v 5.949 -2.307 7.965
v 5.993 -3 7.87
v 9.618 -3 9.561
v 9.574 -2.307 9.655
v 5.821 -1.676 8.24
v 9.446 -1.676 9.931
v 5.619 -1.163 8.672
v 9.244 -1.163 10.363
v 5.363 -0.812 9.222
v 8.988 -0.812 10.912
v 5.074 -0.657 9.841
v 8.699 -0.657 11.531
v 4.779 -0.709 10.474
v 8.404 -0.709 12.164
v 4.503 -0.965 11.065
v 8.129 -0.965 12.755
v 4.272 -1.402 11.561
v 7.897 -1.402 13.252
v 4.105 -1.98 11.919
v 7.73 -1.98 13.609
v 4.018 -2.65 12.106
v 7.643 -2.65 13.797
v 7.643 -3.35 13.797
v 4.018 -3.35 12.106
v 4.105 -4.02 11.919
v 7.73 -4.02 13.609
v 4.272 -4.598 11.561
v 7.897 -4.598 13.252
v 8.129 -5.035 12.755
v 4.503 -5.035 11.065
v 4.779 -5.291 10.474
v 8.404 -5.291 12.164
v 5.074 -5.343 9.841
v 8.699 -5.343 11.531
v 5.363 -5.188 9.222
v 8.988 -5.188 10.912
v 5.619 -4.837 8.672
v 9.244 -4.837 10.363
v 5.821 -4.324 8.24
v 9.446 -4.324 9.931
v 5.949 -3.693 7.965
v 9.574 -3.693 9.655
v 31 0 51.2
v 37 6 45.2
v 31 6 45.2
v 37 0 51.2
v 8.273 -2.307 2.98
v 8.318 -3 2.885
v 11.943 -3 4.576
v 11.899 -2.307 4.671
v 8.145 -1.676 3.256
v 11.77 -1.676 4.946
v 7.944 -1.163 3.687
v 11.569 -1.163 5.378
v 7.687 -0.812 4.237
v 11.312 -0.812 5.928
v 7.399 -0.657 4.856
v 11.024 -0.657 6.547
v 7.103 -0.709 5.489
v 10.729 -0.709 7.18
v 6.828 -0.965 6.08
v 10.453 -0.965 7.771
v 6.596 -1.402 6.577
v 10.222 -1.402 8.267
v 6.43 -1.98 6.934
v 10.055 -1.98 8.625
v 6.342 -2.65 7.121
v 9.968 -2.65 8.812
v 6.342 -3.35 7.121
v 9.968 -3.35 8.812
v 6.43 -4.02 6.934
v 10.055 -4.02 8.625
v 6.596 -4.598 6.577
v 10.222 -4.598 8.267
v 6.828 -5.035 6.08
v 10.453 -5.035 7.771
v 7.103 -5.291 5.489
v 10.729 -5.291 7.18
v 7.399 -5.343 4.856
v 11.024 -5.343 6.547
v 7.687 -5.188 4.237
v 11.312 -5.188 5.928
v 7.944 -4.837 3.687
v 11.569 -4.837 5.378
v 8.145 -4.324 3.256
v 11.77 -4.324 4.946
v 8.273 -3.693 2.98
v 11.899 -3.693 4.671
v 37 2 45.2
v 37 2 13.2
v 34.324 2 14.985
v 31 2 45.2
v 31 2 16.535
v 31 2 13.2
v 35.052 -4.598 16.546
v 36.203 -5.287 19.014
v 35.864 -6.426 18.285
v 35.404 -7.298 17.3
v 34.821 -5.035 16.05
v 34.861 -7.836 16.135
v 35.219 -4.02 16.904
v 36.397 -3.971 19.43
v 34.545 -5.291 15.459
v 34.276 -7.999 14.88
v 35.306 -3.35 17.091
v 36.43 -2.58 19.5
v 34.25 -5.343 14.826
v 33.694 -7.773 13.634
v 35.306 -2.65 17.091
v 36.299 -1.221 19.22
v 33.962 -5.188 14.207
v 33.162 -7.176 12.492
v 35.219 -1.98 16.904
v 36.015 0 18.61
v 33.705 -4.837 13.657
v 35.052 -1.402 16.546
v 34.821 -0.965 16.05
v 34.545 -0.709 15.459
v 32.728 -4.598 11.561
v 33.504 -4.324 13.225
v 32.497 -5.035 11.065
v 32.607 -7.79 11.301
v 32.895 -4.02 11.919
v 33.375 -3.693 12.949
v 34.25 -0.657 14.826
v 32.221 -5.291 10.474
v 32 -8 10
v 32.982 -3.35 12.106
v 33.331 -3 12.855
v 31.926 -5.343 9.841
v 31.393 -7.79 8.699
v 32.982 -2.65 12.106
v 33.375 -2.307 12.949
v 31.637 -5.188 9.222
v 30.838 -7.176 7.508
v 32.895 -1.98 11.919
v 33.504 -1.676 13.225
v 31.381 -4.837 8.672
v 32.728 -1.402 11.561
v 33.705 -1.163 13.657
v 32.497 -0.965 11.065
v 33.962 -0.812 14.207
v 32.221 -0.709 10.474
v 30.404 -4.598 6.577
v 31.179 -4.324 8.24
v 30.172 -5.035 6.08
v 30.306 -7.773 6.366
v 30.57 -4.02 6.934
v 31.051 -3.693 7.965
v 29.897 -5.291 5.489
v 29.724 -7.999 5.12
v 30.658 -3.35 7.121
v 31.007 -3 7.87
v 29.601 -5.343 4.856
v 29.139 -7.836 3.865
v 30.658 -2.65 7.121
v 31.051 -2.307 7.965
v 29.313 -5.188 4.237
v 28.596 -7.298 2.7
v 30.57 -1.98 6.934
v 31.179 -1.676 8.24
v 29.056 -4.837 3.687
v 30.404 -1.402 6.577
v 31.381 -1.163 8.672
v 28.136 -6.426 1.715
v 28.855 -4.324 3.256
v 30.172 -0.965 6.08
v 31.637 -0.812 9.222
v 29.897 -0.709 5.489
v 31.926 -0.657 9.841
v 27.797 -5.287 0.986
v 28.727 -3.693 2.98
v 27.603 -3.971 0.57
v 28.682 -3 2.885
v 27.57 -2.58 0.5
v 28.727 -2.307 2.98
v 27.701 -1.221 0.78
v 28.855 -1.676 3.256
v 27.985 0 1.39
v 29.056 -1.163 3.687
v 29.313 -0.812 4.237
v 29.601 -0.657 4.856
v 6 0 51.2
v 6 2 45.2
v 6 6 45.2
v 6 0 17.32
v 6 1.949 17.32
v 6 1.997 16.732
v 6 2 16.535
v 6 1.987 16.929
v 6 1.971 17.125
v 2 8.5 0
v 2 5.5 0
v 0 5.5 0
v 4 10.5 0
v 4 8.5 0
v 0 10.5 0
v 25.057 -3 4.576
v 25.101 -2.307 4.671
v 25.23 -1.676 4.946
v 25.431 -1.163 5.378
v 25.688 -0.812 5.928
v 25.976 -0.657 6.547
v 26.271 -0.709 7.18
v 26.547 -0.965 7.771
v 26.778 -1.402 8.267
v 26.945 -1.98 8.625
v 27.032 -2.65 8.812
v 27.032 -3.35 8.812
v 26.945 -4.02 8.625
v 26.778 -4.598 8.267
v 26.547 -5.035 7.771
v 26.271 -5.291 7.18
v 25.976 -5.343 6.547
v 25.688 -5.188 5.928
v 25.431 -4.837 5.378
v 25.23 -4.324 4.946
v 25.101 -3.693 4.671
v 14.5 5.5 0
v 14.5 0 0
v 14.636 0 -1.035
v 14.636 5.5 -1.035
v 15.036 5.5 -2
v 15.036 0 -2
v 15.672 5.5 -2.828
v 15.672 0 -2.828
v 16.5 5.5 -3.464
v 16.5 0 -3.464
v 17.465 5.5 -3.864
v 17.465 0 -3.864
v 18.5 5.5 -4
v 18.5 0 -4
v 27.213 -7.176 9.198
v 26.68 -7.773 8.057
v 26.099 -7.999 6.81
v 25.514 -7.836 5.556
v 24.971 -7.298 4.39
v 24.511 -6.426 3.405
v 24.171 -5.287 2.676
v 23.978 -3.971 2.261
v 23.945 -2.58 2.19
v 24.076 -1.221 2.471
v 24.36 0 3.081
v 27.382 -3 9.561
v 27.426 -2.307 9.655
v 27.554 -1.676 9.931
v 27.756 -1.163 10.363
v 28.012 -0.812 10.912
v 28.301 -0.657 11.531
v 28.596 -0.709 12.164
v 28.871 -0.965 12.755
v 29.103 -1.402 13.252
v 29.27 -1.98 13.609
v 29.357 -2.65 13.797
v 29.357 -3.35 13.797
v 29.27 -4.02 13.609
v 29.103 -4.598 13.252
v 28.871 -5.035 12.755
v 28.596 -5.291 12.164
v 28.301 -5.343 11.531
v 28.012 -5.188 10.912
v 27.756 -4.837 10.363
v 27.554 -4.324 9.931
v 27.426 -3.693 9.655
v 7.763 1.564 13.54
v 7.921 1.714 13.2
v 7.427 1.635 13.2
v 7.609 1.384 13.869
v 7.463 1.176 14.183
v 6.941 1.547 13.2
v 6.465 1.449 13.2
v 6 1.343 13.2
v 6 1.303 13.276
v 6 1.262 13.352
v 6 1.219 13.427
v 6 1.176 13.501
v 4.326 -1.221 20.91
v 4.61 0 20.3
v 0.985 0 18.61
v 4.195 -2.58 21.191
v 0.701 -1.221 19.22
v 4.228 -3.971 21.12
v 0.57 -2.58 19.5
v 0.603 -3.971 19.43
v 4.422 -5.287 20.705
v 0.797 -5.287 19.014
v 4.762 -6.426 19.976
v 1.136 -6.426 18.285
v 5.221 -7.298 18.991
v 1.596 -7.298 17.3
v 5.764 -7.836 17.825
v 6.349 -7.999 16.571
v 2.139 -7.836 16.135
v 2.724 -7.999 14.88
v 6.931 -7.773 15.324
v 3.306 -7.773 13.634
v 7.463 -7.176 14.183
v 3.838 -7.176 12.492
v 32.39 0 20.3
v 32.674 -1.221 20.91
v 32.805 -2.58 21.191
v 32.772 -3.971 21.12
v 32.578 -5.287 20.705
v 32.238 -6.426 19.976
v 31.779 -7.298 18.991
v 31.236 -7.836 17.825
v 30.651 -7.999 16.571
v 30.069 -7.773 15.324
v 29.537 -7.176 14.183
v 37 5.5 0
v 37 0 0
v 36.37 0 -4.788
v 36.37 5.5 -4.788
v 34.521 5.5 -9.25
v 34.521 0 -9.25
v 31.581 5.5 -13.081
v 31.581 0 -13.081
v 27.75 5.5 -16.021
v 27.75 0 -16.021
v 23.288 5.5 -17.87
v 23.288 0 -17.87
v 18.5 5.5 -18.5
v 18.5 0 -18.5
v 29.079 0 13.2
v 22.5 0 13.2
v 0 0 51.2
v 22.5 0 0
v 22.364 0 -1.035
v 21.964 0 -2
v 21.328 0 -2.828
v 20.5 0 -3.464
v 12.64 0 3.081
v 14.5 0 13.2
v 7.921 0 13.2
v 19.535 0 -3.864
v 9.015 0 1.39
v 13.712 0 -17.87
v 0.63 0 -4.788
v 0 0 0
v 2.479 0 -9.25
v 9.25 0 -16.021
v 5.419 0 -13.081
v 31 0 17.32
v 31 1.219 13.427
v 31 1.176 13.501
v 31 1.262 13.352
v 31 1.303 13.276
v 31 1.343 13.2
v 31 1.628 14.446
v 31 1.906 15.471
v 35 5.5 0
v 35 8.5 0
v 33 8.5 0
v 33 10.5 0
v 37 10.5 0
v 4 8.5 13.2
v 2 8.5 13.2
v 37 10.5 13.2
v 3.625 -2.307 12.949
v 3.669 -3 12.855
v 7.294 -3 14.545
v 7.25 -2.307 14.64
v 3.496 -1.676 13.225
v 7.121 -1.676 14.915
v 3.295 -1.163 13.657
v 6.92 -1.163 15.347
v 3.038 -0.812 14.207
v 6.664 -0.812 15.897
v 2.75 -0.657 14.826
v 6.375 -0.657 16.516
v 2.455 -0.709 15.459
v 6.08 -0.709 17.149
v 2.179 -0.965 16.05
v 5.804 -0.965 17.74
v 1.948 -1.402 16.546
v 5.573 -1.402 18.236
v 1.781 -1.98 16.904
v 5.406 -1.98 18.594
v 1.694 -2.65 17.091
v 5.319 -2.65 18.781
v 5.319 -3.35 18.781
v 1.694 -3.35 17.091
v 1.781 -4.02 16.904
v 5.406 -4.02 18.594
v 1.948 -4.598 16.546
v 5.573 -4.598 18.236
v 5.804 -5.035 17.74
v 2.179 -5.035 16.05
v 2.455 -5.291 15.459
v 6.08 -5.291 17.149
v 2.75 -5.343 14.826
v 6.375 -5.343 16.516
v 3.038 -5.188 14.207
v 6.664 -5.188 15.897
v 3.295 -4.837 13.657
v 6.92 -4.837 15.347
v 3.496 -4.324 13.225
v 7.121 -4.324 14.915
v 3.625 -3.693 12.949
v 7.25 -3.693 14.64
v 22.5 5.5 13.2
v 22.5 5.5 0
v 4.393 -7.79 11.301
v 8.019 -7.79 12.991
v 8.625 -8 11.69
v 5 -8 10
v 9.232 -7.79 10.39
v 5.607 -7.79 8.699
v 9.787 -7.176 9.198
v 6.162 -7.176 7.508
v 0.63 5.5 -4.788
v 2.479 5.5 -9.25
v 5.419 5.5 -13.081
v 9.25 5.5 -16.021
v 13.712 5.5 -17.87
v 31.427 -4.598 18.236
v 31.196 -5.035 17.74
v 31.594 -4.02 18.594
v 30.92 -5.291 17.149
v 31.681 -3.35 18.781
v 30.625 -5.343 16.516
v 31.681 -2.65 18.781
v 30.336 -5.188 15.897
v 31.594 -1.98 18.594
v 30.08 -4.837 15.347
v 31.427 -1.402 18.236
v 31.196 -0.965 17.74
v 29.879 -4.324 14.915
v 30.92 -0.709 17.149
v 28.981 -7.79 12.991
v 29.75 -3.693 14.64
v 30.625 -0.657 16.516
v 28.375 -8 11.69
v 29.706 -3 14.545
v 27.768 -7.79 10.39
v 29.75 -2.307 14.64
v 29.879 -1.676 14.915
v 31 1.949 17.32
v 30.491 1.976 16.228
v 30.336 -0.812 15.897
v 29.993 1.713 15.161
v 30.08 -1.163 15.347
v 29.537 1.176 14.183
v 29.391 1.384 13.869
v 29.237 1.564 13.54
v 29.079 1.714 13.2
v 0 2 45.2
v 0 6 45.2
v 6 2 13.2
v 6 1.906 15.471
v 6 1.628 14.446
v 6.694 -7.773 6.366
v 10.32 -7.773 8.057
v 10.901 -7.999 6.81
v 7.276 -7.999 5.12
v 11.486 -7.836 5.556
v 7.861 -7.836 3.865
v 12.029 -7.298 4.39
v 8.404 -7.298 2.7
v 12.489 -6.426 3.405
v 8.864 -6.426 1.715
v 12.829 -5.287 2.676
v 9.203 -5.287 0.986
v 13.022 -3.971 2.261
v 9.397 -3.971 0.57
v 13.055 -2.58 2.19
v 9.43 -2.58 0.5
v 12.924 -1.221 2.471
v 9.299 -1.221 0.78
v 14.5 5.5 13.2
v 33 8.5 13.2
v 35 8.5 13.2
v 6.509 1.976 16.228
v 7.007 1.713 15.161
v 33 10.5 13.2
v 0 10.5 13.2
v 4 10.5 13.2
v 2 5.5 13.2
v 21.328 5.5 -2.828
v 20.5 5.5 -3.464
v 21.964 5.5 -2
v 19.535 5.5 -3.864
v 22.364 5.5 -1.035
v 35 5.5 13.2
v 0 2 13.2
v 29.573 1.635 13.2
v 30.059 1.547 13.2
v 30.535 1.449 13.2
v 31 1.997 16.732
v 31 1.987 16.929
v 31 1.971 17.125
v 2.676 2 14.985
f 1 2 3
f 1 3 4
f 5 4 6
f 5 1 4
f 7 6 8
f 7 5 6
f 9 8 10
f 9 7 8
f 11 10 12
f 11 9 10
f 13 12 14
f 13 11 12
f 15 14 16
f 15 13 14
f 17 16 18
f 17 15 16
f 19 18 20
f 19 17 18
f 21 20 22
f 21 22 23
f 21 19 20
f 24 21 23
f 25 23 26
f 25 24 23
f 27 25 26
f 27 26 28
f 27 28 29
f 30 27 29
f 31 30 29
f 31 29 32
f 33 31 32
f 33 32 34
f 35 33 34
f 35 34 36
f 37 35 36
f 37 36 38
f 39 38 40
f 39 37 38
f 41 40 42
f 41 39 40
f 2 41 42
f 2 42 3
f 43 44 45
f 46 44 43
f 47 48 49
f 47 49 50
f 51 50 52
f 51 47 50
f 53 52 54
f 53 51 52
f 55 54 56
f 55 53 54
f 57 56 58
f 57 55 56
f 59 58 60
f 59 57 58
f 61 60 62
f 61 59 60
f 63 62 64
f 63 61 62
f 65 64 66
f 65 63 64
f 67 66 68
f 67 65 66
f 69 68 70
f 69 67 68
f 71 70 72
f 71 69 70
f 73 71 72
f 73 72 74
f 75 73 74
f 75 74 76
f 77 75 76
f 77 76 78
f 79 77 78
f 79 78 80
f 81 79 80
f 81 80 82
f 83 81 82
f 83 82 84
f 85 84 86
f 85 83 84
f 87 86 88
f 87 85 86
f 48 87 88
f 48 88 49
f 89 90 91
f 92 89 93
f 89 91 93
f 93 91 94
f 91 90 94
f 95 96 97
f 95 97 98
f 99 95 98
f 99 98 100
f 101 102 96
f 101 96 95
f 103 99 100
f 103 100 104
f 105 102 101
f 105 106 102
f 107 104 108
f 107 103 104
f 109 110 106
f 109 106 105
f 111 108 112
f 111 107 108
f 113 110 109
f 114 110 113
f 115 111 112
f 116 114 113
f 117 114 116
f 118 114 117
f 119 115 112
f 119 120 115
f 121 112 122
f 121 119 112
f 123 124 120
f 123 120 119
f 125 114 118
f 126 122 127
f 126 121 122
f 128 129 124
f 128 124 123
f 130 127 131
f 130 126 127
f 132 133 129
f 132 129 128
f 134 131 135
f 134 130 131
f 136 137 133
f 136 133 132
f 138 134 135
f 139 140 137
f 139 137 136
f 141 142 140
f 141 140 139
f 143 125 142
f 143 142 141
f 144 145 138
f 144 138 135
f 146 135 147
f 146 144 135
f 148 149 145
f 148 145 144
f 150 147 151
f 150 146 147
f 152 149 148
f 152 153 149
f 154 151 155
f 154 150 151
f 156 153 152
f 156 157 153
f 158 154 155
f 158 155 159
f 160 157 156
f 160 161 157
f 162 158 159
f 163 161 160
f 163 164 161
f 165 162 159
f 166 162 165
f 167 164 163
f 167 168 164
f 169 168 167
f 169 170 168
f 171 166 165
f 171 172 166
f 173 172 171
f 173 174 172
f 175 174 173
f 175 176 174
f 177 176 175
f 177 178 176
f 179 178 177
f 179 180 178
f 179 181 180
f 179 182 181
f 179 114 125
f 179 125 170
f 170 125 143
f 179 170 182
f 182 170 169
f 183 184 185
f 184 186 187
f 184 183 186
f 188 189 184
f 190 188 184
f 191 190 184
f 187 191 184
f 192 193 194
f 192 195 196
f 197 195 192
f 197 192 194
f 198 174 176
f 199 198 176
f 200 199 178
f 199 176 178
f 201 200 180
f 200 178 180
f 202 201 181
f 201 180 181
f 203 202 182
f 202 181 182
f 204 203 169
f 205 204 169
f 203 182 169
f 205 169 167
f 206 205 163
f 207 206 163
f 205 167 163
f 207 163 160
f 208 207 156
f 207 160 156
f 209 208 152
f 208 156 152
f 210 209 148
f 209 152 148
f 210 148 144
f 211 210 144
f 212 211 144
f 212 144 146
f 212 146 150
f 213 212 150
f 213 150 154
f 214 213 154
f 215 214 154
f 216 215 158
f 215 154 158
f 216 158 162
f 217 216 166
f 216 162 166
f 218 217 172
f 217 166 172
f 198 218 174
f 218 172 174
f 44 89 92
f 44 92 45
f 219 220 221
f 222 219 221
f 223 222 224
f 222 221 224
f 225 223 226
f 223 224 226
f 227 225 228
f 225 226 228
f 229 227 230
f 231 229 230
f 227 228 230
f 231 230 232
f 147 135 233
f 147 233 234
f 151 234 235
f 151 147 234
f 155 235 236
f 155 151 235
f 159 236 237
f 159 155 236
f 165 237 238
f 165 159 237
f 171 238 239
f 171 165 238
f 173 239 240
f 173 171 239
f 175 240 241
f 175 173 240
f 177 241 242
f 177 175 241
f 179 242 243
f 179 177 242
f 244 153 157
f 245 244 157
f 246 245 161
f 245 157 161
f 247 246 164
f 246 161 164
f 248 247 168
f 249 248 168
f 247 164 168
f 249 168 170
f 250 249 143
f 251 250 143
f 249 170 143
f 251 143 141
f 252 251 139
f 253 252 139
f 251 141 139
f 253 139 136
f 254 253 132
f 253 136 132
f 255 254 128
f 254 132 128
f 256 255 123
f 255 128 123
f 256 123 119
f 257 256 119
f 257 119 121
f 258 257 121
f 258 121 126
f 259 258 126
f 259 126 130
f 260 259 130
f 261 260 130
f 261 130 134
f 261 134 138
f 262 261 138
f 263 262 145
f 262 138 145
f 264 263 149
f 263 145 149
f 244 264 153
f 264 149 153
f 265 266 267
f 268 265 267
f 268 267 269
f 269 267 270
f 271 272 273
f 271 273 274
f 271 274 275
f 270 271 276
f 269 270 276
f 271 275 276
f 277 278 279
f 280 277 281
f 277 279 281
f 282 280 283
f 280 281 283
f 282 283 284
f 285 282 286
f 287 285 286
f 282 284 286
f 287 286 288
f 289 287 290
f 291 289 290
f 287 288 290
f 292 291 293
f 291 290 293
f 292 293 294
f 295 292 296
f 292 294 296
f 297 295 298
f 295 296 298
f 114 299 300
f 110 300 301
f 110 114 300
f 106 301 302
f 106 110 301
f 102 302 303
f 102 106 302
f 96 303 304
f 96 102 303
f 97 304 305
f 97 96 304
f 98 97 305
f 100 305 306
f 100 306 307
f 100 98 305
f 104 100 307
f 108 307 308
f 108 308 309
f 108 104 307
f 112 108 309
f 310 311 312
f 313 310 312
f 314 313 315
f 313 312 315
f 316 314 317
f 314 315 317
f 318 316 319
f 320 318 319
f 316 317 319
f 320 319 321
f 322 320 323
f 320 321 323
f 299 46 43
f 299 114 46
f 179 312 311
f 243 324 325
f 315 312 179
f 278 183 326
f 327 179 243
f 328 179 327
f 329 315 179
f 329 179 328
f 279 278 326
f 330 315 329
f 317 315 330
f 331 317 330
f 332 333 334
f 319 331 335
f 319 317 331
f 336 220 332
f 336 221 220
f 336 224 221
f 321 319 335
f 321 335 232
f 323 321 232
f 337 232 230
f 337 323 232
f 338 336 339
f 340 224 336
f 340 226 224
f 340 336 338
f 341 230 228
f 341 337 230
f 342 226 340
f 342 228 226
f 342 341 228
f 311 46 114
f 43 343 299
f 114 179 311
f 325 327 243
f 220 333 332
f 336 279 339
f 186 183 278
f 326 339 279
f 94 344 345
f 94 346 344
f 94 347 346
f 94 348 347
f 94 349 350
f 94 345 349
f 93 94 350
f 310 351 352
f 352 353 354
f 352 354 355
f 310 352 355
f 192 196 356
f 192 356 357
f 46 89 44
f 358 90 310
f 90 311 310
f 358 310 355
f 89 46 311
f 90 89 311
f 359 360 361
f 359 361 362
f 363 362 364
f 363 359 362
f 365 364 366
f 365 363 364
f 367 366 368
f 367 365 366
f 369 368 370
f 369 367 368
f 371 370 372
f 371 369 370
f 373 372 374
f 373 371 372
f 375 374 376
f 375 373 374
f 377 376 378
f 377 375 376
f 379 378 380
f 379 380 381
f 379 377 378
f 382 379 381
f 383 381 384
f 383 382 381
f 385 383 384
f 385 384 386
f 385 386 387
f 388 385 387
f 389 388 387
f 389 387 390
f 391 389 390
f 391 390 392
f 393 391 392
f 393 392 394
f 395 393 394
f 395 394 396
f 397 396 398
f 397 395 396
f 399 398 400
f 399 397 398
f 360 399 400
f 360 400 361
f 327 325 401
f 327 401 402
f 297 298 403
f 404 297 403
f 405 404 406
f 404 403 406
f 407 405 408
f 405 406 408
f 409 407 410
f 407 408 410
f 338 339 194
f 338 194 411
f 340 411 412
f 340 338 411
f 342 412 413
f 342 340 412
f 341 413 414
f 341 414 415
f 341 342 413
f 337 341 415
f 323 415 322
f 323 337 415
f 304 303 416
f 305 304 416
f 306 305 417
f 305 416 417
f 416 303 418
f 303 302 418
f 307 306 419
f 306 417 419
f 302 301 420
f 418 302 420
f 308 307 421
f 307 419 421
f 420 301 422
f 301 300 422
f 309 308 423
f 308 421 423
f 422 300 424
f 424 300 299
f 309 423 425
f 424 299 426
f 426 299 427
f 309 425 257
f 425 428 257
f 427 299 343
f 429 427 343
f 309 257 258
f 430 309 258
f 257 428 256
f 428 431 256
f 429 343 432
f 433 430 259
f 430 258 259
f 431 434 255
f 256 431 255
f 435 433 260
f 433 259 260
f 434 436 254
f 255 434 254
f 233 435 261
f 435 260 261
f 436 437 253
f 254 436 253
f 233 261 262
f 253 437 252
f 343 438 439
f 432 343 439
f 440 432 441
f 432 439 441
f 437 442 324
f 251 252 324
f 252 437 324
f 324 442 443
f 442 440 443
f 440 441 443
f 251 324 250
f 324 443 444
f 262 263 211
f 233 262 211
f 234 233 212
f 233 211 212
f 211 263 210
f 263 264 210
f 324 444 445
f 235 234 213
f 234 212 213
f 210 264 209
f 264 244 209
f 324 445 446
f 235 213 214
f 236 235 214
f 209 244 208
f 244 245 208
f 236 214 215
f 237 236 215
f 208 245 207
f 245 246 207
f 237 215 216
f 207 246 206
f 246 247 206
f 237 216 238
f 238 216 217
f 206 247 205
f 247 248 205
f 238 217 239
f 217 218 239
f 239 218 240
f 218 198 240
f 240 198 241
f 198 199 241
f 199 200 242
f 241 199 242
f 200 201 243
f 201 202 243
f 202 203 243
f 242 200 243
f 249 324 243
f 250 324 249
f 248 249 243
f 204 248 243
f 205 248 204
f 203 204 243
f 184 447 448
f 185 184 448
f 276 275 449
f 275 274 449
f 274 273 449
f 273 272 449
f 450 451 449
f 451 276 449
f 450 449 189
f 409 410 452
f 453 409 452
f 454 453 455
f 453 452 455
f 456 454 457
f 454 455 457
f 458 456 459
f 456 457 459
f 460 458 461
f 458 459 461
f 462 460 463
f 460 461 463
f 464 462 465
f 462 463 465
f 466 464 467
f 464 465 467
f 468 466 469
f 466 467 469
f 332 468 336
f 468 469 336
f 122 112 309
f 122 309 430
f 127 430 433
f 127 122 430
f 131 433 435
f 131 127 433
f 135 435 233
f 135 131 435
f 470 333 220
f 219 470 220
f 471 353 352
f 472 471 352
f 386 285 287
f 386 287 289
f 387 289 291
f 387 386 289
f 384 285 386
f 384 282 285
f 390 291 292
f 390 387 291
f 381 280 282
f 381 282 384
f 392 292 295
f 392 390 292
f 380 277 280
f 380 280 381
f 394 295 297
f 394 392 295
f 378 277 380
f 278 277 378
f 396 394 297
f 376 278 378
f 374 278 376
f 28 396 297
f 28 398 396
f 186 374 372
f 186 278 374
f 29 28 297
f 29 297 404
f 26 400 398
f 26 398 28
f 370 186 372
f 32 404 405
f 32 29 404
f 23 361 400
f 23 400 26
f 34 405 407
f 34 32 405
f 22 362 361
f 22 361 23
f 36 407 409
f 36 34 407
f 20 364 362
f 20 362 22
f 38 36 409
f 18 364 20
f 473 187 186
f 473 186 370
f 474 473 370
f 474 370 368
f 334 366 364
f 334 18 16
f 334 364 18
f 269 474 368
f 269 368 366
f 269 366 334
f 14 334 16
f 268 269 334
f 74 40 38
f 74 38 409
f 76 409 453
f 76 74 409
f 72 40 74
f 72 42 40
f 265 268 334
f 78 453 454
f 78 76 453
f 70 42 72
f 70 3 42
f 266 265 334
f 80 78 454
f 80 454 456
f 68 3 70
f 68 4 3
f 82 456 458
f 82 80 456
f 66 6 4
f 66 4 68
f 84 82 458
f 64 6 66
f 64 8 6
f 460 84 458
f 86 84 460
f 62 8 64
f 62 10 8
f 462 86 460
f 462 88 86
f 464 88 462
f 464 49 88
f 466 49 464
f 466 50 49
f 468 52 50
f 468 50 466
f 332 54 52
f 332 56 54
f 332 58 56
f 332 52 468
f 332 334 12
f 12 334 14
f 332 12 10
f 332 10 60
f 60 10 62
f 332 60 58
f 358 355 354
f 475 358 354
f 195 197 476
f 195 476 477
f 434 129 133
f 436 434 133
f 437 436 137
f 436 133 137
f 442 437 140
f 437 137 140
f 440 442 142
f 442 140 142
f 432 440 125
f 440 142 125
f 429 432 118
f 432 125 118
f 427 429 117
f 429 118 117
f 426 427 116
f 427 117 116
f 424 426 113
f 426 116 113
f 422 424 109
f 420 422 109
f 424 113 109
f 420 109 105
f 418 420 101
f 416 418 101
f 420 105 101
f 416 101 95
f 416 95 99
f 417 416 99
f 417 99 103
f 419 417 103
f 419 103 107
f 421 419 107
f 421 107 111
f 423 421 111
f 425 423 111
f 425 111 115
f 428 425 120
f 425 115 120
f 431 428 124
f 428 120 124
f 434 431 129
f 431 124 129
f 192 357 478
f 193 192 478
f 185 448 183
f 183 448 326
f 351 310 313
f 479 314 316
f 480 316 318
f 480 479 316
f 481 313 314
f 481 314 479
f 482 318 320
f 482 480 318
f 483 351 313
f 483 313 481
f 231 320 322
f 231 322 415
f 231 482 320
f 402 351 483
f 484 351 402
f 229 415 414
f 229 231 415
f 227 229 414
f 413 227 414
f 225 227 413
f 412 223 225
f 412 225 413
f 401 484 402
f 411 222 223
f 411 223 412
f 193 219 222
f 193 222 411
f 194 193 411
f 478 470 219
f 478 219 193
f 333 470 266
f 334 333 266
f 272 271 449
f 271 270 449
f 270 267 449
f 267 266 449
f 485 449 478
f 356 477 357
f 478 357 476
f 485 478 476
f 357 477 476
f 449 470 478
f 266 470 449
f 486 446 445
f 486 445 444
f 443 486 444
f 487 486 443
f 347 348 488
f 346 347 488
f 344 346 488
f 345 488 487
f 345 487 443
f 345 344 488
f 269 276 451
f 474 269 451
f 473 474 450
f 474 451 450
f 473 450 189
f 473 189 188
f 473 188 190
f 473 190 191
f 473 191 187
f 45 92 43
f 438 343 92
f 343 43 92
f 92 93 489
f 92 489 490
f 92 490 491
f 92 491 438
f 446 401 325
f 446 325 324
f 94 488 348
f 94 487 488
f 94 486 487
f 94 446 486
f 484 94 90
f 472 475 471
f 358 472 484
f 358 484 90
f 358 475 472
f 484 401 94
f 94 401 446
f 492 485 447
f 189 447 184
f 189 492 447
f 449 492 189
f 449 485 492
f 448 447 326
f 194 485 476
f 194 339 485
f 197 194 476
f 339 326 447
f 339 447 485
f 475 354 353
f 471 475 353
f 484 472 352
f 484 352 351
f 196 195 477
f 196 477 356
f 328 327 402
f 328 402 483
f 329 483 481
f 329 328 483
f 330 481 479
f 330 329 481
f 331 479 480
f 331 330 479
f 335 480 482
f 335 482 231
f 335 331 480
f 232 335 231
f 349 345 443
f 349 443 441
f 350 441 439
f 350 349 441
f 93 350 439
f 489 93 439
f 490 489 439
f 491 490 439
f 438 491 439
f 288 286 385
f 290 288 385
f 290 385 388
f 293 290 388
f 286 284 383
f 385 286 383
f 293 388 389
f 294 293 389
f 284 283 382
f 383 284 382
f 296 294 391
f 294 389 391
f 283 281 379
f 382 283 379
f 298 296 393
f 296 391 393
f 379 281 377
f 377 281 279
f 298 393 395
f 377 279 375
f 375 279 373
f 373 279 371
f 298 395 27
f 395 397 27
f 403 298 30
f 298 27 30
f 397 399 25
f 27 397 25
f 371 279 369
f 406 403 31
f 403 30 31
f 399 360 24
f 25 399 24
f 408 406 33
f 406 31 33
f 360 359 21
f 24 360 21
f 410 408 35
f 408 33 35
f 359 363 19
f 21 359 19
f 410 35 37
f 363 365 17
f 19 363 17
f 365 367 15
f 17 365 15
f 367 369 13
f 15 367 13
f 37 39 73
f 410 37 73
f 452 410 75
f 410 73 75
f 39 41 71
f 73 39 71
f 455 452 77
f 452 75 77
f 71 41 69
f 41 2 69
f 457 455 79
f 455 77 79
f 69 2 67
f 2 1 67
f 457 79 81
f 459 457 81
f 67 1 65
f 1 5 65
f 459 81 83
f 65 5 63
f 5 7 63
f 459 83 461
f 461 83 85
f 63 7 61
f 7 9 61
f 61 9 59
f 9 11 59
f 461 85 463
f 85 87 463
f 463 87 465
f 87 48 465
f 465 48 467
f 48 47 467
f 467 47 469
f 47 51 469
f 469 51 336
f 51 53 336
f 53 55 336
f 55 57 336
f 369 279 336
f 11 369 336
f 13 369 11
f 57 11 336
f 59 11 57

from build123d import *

# Parameters (mm, degrees)
SKETCH002_R  = 2.35
PAD005_DEPTH = 4
PAD002_DEPTH = 8
PAD001_DEPTH = 5.5
PAD_DEPTH    = 13.2
SKETCH005_W  = 6
SKETCH005_H  = 2
PAD003_DEPTH = 38
PAD004_DEPTH = 6
POCKET_DEPTH = 6


with BuildPart() as pad005:
    # Sketch002 → Pad005 (new body)
    with BuildSketch(Plane(origin=(5, -3, 10), x_dir=(0.422618, 0, -0.906308), z_dir=(0.906308, 0, 0.422618))):
        with BuildLine():
            ThreePointArc((-2.75, 4.175823), (-10.5, 0), (-2.75, -4.175823))
            ThreePointArc((-2.75, -4.175823), (0, -5), (2.75, -4.175823))
            ThreePointArc((2.75, -4.175823), (10.5, 0), (2.75, 4.175823))
            ThreePointArc((2.75, 4.175823), (0, 5), (-2.75, 4.175823))
        make_face()
        with Locations((-5.5, 0)):
            Circle(SKETCH002_R, mode=Mode.SUBTRACT)
        Circle(SKETCH002_R, mode=Mode.SUBTRACT)
        with Locations((5.5, 0)):
            Circle(SKETCH002_R, mode=Mode.SUBTRACT)
    extrude(amount=PAD005_DEPTH)


with BuildPart() as pad002:
    # Sketch004 → Pad002 (new body)
    with BuildSketch(Plane.XZ):
        with BuildLine():
            Line((14.5, 20), (18.5, 20))
            Line((18.5, 20), (18.5, -4))
            ThreePointArc((14.5, 1.7e-05), (15.671567, -2.828421), (18.5, -4))
            Line((14.5, 20), (14.5, 1.7e-05))
        make_face()
    extrude(amount=-PAD002_DEPTH)


with BuildPart() as pad001:
    # Sketch001 → Pad001 (new body)
    with BuildSketch(Plane.XZ):
        with BuildLine():
            ThreePointArc((0, 0), (5.418525, -13.081475), (18.5, -18.5))
            Line((18.5, 0), (18.5, -18.5))
            Line((18.5, 0), (0, 0))
        make_face()
    extrude(amount=-PAD001_DEPTH)


with BuildPart() as fusion001:
    # Sketch → Pad (new body)
    with BuildSketch(Plane.XY):
        Polygon((2, 5.5), (18.5, 5.5), (18.5, 0), (0, 0), (0, 10.5), (4, 10.5), (4, 8.5), (2, 8.5), align=None)
    extrude(amount=PAD_DEPTH)

    # Fusion: union Pad001
    add(pad001.part)

    # Cut: cut Pad002
    add(pad002.part, mode=Mode.SUBTRACT)

    # Sketch005 → Pad003 (new body)
    with BuildSketch(Plane.XY.offset(13.2)):
        with Locations((3, 1)):
            Rectangle(SKETCH005_W, SKETCH005_H)
    extrude(amount=PAD003_DEPTH)

    # Sketch006 → Pad004 (new body)
    with BuildSketch(Plane(origin=(0, 0, 0), x_dir=(0, -1, 0), z_dir=(-1, 0, 0))):
        Polygon((0, 51.2), (0, 45.2), (-6, 45.2), align=None)
    extrude(amount=-PAD004_DEPTH)

    # Sketch007 → Pocket (cut)
    with BuildSketch(Plane(origin=(0, 0, 0), x_dir=(0, -1, 0), z_dir=(-1, 0, 0))):
        Polygon((-2, 51.2), (0, 51.2), (-2, 49.2), align=None)
    extrude(amount=-POCKET_DEPTH, mode=Mode.SUBTRACT)

    # Fusion001: union Pad005
    add(pad005.part)


with BuildPart() as part_mirroring:
    # Part__Mirroring: instance of Fusion001
    add(fusion001.part.mirror(Plane(origin=(0, 0, 0), x_dir=(0, -1, 0), z_dir=(1, 0, 0))))


with BuildPart() as part_mirroring_1:
    # Part__Mirroring placement: moved
    add(part_mirroring.part.moved(Location((37, 0, 0))))


with BuildPart() as fusion002:
    # Fusion002 base: copy of Fusion001
    add(fusion001.part)

    # Fusion002: union Part__Mirroring
    add(part_mirroring_1.part)


solid = fusion002.part
